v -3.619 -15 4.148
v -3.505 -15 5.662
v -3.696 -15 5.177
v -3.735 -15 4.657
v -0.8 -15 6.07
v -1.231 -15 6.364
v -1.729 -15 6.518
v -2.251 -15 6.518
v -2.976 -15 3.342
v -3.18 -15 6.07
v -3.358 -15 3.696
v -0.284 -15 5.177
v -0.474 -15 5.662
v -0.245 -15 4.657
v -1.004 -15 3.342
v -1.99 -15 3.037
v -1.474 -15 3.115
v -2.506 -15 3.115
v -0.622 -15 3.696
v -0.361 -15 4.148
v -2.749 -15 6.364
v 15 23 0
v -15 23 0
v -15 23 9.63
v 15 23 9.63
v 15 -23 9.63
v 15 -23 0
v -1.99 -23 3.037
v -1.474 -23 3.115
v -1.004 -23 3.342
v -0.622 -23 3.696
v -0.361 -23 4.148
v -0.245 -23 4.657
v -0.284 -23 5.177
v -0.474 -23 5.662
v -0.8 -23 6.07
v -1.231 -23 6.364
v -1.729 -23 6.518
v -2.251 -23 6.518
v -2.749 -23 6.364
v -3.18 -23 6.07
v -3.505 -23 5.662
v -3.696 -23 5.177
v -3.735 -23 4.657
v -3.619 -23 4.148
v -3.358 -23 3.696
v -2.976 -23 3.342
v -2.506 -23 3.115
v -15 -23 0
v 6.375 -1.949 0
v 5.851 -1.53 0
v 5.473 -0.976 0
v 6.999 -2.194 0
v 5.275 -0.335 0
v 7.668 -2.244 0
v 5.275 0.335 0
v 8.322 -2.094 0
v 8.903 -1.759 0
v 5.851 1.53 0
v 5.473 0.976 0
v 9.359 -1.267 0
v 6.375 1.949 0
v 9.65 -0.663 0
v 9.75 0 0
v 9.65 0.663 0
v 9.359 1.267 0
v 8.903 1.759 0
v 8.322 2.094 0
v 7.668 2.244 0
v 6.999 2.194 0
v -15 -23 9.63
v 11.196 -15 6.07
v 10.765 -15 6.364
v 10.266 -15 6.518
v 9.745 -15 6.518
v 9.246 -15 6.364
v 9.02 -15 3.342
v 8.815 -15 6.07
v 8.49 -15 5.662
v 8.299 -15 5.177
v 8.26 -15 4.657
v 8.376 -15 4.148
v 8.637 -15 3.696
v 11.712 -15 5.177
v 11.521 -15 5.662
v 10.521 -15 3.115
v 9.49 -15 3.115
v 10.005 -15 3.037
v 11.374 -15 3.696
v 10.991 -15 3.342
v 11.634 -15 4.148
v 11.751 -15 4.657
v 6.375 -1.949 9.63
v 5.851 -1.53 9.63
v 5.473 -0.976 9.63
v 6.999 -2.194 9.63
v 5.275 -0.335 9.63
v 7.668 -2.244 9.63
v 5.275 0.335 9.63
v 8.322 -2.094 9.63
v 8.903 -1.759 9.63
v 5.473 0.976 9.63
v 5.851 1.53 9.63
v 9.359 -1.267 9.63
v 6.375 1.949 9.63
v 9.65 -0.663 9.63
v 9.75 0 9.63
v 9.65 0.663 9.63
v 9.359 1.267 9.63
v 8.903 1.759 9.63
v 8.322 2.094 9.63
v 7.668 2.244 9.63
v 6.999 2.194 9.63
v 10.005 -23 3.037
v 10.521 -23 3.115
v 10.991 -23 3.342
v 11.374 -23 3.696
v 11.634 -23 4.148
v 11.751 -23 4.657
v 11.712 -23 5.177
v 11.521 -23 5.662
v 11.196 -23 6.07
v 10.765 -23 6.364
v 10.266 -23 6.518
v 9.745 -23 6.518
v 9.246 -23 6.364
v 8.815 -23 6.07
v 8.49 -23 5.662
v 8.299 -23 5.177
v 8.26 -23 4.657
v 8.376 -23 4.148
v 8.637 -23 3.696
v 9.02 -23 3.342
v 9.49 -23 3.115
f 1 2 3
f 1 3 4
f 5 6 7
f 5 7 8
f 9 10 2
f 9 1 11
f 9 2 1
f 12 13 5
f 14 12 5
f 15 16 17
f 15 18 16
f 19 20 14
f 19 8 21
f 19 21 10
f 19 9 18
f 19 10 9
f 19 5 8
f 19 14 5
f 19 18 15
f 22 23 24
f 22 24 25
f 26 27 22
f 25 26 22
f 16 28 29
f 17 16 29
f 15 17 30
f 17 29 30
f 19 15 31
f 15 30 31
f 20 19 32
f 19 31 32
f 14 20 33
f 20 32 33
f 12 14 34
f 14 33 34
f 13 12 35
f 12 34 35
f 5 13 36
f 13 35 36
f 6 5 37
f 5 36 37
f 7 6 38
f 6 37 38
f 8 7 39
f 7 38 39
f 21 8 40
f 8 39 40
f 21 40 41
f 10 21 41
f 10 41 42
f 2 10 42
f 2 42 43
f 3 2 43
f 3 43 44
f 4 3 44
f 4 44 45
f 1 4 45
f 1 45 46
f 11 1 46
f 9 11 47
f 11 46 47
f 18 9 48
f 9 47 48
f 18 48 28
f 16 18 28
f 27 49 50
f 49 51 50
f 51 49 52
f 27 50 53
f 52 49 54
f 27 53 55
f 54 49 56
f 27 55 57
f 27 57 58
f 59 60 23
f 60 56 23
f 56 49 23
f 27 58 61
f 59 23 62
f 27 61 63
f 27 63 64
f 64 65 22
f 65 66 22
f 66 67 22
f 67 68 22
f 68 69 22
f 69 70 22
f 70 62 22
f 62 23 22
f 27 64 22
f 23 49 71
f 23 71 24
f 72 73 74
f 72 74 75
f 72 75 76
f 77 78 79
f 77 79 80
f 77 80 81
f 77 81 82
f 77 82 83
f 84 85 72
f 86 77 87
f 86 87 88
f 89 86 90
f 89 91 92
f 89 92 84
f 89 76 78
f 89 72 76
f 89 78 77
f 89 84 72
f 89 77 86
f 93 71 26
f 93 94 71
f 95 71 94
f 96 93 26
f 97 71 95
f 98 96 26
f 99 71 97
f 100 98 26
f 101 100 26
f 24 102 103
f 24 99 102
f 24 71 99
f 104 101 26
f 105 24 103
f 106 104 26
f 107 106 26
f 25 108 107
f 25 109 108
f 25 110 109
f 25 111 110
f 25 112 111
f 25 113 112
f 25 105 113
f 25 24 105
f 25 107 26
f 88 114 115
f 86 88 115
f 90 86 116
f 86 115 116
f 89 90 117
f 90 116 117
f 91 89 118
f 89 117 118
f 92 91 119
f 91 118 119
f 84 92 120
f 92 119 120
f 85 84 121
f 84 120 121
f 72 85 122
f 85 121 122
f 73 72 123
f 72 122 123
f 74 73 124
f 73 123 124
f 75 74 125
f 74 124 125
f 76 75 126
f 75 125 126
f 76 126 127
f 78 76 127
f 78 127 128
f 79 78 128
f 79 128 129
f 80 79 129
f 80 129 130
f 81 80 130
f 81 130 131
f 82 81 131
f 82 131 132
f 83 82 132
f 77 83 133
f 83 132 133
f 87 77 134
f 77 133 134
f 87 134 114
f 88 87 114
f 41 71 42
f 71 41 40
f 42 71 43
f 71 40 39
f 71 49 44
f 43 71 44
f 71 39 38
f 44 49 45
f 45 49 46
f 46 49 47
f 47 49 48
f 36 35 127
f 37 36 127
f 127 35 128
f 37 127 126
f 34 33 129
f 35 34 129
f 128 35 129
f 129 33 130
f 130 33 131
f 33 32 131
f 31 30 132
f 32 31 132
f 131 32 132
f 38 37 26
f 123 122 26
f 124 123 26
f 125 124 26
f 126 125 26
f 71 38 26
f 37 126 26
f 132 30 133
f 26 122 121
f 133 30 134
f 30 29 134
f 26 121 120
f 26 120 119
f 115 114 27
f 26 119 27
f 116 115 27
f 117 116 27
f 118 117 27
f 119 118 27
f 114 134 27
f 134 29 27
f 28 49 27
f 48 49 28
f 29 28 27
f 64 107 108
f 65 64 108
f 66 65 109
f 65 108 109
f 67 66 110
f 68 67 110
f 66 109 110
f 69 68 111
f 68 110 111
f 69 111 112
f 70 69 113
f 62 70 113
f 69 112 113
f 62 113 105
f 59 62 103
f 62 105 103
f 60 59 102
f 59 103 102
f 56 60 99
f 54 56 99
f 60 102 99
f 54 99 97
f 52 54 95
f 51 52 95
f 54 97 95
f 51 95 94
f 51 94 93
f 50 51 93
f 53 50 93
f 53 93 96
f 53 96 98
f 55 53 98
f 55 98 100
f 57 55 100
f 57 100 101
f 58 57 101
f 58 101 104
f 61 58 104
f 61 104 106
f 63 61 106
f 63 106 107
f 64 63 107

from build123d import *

# Parameters (mm, degrees)
SKETCH1_W          = 30
SKETCH1_H          = 46
EXTRUDE_3_8_DEPTH  = 9.63
SKETCH3_R          = 1.75
M4_DRILL_DEPTH     = 8
SKETCH5_R          = 2.25
CUT_EXTRUDE1_DEPTH = 10


with BuildPart() as part:
    # Sketch1 → 3/8 (new body)
    with BuildSketch(Plane.XY):
        Rectangle(SKETCH1_W, SKETCH1_H)
    extrude(amount=EXTRUDE_3_8_DEPTH)

    # Sketch3 → M4_DRILL (cut)
    with BuildSketch(Plane.XZ.offset(23)):
        with Locations(Location((-1.989909349, 4.787451112, 0), (0, 0, 270))):
            Circle(SKETCH3_R)
        with Locations(Location((10.005417301, 4.787451112, 0), (0, 0, 270))):
            Circle(SKETCH3_R)
    extrude(amount=-M4_DRILL_DEPTH, mode=Mode.SUBTRACT)

    # Sketch5 → Cut-Extrude1 (cut)
    with BuildSketch(Plane.XY.offset(9.63)):
        with Locations((7.5, 0)):
            Circle(SKETCH5_R)
    extrude(amount=-CUT_EXTRUDE1_DEPTH, mode=Mode.SUBTRACT)


solid = part.part
